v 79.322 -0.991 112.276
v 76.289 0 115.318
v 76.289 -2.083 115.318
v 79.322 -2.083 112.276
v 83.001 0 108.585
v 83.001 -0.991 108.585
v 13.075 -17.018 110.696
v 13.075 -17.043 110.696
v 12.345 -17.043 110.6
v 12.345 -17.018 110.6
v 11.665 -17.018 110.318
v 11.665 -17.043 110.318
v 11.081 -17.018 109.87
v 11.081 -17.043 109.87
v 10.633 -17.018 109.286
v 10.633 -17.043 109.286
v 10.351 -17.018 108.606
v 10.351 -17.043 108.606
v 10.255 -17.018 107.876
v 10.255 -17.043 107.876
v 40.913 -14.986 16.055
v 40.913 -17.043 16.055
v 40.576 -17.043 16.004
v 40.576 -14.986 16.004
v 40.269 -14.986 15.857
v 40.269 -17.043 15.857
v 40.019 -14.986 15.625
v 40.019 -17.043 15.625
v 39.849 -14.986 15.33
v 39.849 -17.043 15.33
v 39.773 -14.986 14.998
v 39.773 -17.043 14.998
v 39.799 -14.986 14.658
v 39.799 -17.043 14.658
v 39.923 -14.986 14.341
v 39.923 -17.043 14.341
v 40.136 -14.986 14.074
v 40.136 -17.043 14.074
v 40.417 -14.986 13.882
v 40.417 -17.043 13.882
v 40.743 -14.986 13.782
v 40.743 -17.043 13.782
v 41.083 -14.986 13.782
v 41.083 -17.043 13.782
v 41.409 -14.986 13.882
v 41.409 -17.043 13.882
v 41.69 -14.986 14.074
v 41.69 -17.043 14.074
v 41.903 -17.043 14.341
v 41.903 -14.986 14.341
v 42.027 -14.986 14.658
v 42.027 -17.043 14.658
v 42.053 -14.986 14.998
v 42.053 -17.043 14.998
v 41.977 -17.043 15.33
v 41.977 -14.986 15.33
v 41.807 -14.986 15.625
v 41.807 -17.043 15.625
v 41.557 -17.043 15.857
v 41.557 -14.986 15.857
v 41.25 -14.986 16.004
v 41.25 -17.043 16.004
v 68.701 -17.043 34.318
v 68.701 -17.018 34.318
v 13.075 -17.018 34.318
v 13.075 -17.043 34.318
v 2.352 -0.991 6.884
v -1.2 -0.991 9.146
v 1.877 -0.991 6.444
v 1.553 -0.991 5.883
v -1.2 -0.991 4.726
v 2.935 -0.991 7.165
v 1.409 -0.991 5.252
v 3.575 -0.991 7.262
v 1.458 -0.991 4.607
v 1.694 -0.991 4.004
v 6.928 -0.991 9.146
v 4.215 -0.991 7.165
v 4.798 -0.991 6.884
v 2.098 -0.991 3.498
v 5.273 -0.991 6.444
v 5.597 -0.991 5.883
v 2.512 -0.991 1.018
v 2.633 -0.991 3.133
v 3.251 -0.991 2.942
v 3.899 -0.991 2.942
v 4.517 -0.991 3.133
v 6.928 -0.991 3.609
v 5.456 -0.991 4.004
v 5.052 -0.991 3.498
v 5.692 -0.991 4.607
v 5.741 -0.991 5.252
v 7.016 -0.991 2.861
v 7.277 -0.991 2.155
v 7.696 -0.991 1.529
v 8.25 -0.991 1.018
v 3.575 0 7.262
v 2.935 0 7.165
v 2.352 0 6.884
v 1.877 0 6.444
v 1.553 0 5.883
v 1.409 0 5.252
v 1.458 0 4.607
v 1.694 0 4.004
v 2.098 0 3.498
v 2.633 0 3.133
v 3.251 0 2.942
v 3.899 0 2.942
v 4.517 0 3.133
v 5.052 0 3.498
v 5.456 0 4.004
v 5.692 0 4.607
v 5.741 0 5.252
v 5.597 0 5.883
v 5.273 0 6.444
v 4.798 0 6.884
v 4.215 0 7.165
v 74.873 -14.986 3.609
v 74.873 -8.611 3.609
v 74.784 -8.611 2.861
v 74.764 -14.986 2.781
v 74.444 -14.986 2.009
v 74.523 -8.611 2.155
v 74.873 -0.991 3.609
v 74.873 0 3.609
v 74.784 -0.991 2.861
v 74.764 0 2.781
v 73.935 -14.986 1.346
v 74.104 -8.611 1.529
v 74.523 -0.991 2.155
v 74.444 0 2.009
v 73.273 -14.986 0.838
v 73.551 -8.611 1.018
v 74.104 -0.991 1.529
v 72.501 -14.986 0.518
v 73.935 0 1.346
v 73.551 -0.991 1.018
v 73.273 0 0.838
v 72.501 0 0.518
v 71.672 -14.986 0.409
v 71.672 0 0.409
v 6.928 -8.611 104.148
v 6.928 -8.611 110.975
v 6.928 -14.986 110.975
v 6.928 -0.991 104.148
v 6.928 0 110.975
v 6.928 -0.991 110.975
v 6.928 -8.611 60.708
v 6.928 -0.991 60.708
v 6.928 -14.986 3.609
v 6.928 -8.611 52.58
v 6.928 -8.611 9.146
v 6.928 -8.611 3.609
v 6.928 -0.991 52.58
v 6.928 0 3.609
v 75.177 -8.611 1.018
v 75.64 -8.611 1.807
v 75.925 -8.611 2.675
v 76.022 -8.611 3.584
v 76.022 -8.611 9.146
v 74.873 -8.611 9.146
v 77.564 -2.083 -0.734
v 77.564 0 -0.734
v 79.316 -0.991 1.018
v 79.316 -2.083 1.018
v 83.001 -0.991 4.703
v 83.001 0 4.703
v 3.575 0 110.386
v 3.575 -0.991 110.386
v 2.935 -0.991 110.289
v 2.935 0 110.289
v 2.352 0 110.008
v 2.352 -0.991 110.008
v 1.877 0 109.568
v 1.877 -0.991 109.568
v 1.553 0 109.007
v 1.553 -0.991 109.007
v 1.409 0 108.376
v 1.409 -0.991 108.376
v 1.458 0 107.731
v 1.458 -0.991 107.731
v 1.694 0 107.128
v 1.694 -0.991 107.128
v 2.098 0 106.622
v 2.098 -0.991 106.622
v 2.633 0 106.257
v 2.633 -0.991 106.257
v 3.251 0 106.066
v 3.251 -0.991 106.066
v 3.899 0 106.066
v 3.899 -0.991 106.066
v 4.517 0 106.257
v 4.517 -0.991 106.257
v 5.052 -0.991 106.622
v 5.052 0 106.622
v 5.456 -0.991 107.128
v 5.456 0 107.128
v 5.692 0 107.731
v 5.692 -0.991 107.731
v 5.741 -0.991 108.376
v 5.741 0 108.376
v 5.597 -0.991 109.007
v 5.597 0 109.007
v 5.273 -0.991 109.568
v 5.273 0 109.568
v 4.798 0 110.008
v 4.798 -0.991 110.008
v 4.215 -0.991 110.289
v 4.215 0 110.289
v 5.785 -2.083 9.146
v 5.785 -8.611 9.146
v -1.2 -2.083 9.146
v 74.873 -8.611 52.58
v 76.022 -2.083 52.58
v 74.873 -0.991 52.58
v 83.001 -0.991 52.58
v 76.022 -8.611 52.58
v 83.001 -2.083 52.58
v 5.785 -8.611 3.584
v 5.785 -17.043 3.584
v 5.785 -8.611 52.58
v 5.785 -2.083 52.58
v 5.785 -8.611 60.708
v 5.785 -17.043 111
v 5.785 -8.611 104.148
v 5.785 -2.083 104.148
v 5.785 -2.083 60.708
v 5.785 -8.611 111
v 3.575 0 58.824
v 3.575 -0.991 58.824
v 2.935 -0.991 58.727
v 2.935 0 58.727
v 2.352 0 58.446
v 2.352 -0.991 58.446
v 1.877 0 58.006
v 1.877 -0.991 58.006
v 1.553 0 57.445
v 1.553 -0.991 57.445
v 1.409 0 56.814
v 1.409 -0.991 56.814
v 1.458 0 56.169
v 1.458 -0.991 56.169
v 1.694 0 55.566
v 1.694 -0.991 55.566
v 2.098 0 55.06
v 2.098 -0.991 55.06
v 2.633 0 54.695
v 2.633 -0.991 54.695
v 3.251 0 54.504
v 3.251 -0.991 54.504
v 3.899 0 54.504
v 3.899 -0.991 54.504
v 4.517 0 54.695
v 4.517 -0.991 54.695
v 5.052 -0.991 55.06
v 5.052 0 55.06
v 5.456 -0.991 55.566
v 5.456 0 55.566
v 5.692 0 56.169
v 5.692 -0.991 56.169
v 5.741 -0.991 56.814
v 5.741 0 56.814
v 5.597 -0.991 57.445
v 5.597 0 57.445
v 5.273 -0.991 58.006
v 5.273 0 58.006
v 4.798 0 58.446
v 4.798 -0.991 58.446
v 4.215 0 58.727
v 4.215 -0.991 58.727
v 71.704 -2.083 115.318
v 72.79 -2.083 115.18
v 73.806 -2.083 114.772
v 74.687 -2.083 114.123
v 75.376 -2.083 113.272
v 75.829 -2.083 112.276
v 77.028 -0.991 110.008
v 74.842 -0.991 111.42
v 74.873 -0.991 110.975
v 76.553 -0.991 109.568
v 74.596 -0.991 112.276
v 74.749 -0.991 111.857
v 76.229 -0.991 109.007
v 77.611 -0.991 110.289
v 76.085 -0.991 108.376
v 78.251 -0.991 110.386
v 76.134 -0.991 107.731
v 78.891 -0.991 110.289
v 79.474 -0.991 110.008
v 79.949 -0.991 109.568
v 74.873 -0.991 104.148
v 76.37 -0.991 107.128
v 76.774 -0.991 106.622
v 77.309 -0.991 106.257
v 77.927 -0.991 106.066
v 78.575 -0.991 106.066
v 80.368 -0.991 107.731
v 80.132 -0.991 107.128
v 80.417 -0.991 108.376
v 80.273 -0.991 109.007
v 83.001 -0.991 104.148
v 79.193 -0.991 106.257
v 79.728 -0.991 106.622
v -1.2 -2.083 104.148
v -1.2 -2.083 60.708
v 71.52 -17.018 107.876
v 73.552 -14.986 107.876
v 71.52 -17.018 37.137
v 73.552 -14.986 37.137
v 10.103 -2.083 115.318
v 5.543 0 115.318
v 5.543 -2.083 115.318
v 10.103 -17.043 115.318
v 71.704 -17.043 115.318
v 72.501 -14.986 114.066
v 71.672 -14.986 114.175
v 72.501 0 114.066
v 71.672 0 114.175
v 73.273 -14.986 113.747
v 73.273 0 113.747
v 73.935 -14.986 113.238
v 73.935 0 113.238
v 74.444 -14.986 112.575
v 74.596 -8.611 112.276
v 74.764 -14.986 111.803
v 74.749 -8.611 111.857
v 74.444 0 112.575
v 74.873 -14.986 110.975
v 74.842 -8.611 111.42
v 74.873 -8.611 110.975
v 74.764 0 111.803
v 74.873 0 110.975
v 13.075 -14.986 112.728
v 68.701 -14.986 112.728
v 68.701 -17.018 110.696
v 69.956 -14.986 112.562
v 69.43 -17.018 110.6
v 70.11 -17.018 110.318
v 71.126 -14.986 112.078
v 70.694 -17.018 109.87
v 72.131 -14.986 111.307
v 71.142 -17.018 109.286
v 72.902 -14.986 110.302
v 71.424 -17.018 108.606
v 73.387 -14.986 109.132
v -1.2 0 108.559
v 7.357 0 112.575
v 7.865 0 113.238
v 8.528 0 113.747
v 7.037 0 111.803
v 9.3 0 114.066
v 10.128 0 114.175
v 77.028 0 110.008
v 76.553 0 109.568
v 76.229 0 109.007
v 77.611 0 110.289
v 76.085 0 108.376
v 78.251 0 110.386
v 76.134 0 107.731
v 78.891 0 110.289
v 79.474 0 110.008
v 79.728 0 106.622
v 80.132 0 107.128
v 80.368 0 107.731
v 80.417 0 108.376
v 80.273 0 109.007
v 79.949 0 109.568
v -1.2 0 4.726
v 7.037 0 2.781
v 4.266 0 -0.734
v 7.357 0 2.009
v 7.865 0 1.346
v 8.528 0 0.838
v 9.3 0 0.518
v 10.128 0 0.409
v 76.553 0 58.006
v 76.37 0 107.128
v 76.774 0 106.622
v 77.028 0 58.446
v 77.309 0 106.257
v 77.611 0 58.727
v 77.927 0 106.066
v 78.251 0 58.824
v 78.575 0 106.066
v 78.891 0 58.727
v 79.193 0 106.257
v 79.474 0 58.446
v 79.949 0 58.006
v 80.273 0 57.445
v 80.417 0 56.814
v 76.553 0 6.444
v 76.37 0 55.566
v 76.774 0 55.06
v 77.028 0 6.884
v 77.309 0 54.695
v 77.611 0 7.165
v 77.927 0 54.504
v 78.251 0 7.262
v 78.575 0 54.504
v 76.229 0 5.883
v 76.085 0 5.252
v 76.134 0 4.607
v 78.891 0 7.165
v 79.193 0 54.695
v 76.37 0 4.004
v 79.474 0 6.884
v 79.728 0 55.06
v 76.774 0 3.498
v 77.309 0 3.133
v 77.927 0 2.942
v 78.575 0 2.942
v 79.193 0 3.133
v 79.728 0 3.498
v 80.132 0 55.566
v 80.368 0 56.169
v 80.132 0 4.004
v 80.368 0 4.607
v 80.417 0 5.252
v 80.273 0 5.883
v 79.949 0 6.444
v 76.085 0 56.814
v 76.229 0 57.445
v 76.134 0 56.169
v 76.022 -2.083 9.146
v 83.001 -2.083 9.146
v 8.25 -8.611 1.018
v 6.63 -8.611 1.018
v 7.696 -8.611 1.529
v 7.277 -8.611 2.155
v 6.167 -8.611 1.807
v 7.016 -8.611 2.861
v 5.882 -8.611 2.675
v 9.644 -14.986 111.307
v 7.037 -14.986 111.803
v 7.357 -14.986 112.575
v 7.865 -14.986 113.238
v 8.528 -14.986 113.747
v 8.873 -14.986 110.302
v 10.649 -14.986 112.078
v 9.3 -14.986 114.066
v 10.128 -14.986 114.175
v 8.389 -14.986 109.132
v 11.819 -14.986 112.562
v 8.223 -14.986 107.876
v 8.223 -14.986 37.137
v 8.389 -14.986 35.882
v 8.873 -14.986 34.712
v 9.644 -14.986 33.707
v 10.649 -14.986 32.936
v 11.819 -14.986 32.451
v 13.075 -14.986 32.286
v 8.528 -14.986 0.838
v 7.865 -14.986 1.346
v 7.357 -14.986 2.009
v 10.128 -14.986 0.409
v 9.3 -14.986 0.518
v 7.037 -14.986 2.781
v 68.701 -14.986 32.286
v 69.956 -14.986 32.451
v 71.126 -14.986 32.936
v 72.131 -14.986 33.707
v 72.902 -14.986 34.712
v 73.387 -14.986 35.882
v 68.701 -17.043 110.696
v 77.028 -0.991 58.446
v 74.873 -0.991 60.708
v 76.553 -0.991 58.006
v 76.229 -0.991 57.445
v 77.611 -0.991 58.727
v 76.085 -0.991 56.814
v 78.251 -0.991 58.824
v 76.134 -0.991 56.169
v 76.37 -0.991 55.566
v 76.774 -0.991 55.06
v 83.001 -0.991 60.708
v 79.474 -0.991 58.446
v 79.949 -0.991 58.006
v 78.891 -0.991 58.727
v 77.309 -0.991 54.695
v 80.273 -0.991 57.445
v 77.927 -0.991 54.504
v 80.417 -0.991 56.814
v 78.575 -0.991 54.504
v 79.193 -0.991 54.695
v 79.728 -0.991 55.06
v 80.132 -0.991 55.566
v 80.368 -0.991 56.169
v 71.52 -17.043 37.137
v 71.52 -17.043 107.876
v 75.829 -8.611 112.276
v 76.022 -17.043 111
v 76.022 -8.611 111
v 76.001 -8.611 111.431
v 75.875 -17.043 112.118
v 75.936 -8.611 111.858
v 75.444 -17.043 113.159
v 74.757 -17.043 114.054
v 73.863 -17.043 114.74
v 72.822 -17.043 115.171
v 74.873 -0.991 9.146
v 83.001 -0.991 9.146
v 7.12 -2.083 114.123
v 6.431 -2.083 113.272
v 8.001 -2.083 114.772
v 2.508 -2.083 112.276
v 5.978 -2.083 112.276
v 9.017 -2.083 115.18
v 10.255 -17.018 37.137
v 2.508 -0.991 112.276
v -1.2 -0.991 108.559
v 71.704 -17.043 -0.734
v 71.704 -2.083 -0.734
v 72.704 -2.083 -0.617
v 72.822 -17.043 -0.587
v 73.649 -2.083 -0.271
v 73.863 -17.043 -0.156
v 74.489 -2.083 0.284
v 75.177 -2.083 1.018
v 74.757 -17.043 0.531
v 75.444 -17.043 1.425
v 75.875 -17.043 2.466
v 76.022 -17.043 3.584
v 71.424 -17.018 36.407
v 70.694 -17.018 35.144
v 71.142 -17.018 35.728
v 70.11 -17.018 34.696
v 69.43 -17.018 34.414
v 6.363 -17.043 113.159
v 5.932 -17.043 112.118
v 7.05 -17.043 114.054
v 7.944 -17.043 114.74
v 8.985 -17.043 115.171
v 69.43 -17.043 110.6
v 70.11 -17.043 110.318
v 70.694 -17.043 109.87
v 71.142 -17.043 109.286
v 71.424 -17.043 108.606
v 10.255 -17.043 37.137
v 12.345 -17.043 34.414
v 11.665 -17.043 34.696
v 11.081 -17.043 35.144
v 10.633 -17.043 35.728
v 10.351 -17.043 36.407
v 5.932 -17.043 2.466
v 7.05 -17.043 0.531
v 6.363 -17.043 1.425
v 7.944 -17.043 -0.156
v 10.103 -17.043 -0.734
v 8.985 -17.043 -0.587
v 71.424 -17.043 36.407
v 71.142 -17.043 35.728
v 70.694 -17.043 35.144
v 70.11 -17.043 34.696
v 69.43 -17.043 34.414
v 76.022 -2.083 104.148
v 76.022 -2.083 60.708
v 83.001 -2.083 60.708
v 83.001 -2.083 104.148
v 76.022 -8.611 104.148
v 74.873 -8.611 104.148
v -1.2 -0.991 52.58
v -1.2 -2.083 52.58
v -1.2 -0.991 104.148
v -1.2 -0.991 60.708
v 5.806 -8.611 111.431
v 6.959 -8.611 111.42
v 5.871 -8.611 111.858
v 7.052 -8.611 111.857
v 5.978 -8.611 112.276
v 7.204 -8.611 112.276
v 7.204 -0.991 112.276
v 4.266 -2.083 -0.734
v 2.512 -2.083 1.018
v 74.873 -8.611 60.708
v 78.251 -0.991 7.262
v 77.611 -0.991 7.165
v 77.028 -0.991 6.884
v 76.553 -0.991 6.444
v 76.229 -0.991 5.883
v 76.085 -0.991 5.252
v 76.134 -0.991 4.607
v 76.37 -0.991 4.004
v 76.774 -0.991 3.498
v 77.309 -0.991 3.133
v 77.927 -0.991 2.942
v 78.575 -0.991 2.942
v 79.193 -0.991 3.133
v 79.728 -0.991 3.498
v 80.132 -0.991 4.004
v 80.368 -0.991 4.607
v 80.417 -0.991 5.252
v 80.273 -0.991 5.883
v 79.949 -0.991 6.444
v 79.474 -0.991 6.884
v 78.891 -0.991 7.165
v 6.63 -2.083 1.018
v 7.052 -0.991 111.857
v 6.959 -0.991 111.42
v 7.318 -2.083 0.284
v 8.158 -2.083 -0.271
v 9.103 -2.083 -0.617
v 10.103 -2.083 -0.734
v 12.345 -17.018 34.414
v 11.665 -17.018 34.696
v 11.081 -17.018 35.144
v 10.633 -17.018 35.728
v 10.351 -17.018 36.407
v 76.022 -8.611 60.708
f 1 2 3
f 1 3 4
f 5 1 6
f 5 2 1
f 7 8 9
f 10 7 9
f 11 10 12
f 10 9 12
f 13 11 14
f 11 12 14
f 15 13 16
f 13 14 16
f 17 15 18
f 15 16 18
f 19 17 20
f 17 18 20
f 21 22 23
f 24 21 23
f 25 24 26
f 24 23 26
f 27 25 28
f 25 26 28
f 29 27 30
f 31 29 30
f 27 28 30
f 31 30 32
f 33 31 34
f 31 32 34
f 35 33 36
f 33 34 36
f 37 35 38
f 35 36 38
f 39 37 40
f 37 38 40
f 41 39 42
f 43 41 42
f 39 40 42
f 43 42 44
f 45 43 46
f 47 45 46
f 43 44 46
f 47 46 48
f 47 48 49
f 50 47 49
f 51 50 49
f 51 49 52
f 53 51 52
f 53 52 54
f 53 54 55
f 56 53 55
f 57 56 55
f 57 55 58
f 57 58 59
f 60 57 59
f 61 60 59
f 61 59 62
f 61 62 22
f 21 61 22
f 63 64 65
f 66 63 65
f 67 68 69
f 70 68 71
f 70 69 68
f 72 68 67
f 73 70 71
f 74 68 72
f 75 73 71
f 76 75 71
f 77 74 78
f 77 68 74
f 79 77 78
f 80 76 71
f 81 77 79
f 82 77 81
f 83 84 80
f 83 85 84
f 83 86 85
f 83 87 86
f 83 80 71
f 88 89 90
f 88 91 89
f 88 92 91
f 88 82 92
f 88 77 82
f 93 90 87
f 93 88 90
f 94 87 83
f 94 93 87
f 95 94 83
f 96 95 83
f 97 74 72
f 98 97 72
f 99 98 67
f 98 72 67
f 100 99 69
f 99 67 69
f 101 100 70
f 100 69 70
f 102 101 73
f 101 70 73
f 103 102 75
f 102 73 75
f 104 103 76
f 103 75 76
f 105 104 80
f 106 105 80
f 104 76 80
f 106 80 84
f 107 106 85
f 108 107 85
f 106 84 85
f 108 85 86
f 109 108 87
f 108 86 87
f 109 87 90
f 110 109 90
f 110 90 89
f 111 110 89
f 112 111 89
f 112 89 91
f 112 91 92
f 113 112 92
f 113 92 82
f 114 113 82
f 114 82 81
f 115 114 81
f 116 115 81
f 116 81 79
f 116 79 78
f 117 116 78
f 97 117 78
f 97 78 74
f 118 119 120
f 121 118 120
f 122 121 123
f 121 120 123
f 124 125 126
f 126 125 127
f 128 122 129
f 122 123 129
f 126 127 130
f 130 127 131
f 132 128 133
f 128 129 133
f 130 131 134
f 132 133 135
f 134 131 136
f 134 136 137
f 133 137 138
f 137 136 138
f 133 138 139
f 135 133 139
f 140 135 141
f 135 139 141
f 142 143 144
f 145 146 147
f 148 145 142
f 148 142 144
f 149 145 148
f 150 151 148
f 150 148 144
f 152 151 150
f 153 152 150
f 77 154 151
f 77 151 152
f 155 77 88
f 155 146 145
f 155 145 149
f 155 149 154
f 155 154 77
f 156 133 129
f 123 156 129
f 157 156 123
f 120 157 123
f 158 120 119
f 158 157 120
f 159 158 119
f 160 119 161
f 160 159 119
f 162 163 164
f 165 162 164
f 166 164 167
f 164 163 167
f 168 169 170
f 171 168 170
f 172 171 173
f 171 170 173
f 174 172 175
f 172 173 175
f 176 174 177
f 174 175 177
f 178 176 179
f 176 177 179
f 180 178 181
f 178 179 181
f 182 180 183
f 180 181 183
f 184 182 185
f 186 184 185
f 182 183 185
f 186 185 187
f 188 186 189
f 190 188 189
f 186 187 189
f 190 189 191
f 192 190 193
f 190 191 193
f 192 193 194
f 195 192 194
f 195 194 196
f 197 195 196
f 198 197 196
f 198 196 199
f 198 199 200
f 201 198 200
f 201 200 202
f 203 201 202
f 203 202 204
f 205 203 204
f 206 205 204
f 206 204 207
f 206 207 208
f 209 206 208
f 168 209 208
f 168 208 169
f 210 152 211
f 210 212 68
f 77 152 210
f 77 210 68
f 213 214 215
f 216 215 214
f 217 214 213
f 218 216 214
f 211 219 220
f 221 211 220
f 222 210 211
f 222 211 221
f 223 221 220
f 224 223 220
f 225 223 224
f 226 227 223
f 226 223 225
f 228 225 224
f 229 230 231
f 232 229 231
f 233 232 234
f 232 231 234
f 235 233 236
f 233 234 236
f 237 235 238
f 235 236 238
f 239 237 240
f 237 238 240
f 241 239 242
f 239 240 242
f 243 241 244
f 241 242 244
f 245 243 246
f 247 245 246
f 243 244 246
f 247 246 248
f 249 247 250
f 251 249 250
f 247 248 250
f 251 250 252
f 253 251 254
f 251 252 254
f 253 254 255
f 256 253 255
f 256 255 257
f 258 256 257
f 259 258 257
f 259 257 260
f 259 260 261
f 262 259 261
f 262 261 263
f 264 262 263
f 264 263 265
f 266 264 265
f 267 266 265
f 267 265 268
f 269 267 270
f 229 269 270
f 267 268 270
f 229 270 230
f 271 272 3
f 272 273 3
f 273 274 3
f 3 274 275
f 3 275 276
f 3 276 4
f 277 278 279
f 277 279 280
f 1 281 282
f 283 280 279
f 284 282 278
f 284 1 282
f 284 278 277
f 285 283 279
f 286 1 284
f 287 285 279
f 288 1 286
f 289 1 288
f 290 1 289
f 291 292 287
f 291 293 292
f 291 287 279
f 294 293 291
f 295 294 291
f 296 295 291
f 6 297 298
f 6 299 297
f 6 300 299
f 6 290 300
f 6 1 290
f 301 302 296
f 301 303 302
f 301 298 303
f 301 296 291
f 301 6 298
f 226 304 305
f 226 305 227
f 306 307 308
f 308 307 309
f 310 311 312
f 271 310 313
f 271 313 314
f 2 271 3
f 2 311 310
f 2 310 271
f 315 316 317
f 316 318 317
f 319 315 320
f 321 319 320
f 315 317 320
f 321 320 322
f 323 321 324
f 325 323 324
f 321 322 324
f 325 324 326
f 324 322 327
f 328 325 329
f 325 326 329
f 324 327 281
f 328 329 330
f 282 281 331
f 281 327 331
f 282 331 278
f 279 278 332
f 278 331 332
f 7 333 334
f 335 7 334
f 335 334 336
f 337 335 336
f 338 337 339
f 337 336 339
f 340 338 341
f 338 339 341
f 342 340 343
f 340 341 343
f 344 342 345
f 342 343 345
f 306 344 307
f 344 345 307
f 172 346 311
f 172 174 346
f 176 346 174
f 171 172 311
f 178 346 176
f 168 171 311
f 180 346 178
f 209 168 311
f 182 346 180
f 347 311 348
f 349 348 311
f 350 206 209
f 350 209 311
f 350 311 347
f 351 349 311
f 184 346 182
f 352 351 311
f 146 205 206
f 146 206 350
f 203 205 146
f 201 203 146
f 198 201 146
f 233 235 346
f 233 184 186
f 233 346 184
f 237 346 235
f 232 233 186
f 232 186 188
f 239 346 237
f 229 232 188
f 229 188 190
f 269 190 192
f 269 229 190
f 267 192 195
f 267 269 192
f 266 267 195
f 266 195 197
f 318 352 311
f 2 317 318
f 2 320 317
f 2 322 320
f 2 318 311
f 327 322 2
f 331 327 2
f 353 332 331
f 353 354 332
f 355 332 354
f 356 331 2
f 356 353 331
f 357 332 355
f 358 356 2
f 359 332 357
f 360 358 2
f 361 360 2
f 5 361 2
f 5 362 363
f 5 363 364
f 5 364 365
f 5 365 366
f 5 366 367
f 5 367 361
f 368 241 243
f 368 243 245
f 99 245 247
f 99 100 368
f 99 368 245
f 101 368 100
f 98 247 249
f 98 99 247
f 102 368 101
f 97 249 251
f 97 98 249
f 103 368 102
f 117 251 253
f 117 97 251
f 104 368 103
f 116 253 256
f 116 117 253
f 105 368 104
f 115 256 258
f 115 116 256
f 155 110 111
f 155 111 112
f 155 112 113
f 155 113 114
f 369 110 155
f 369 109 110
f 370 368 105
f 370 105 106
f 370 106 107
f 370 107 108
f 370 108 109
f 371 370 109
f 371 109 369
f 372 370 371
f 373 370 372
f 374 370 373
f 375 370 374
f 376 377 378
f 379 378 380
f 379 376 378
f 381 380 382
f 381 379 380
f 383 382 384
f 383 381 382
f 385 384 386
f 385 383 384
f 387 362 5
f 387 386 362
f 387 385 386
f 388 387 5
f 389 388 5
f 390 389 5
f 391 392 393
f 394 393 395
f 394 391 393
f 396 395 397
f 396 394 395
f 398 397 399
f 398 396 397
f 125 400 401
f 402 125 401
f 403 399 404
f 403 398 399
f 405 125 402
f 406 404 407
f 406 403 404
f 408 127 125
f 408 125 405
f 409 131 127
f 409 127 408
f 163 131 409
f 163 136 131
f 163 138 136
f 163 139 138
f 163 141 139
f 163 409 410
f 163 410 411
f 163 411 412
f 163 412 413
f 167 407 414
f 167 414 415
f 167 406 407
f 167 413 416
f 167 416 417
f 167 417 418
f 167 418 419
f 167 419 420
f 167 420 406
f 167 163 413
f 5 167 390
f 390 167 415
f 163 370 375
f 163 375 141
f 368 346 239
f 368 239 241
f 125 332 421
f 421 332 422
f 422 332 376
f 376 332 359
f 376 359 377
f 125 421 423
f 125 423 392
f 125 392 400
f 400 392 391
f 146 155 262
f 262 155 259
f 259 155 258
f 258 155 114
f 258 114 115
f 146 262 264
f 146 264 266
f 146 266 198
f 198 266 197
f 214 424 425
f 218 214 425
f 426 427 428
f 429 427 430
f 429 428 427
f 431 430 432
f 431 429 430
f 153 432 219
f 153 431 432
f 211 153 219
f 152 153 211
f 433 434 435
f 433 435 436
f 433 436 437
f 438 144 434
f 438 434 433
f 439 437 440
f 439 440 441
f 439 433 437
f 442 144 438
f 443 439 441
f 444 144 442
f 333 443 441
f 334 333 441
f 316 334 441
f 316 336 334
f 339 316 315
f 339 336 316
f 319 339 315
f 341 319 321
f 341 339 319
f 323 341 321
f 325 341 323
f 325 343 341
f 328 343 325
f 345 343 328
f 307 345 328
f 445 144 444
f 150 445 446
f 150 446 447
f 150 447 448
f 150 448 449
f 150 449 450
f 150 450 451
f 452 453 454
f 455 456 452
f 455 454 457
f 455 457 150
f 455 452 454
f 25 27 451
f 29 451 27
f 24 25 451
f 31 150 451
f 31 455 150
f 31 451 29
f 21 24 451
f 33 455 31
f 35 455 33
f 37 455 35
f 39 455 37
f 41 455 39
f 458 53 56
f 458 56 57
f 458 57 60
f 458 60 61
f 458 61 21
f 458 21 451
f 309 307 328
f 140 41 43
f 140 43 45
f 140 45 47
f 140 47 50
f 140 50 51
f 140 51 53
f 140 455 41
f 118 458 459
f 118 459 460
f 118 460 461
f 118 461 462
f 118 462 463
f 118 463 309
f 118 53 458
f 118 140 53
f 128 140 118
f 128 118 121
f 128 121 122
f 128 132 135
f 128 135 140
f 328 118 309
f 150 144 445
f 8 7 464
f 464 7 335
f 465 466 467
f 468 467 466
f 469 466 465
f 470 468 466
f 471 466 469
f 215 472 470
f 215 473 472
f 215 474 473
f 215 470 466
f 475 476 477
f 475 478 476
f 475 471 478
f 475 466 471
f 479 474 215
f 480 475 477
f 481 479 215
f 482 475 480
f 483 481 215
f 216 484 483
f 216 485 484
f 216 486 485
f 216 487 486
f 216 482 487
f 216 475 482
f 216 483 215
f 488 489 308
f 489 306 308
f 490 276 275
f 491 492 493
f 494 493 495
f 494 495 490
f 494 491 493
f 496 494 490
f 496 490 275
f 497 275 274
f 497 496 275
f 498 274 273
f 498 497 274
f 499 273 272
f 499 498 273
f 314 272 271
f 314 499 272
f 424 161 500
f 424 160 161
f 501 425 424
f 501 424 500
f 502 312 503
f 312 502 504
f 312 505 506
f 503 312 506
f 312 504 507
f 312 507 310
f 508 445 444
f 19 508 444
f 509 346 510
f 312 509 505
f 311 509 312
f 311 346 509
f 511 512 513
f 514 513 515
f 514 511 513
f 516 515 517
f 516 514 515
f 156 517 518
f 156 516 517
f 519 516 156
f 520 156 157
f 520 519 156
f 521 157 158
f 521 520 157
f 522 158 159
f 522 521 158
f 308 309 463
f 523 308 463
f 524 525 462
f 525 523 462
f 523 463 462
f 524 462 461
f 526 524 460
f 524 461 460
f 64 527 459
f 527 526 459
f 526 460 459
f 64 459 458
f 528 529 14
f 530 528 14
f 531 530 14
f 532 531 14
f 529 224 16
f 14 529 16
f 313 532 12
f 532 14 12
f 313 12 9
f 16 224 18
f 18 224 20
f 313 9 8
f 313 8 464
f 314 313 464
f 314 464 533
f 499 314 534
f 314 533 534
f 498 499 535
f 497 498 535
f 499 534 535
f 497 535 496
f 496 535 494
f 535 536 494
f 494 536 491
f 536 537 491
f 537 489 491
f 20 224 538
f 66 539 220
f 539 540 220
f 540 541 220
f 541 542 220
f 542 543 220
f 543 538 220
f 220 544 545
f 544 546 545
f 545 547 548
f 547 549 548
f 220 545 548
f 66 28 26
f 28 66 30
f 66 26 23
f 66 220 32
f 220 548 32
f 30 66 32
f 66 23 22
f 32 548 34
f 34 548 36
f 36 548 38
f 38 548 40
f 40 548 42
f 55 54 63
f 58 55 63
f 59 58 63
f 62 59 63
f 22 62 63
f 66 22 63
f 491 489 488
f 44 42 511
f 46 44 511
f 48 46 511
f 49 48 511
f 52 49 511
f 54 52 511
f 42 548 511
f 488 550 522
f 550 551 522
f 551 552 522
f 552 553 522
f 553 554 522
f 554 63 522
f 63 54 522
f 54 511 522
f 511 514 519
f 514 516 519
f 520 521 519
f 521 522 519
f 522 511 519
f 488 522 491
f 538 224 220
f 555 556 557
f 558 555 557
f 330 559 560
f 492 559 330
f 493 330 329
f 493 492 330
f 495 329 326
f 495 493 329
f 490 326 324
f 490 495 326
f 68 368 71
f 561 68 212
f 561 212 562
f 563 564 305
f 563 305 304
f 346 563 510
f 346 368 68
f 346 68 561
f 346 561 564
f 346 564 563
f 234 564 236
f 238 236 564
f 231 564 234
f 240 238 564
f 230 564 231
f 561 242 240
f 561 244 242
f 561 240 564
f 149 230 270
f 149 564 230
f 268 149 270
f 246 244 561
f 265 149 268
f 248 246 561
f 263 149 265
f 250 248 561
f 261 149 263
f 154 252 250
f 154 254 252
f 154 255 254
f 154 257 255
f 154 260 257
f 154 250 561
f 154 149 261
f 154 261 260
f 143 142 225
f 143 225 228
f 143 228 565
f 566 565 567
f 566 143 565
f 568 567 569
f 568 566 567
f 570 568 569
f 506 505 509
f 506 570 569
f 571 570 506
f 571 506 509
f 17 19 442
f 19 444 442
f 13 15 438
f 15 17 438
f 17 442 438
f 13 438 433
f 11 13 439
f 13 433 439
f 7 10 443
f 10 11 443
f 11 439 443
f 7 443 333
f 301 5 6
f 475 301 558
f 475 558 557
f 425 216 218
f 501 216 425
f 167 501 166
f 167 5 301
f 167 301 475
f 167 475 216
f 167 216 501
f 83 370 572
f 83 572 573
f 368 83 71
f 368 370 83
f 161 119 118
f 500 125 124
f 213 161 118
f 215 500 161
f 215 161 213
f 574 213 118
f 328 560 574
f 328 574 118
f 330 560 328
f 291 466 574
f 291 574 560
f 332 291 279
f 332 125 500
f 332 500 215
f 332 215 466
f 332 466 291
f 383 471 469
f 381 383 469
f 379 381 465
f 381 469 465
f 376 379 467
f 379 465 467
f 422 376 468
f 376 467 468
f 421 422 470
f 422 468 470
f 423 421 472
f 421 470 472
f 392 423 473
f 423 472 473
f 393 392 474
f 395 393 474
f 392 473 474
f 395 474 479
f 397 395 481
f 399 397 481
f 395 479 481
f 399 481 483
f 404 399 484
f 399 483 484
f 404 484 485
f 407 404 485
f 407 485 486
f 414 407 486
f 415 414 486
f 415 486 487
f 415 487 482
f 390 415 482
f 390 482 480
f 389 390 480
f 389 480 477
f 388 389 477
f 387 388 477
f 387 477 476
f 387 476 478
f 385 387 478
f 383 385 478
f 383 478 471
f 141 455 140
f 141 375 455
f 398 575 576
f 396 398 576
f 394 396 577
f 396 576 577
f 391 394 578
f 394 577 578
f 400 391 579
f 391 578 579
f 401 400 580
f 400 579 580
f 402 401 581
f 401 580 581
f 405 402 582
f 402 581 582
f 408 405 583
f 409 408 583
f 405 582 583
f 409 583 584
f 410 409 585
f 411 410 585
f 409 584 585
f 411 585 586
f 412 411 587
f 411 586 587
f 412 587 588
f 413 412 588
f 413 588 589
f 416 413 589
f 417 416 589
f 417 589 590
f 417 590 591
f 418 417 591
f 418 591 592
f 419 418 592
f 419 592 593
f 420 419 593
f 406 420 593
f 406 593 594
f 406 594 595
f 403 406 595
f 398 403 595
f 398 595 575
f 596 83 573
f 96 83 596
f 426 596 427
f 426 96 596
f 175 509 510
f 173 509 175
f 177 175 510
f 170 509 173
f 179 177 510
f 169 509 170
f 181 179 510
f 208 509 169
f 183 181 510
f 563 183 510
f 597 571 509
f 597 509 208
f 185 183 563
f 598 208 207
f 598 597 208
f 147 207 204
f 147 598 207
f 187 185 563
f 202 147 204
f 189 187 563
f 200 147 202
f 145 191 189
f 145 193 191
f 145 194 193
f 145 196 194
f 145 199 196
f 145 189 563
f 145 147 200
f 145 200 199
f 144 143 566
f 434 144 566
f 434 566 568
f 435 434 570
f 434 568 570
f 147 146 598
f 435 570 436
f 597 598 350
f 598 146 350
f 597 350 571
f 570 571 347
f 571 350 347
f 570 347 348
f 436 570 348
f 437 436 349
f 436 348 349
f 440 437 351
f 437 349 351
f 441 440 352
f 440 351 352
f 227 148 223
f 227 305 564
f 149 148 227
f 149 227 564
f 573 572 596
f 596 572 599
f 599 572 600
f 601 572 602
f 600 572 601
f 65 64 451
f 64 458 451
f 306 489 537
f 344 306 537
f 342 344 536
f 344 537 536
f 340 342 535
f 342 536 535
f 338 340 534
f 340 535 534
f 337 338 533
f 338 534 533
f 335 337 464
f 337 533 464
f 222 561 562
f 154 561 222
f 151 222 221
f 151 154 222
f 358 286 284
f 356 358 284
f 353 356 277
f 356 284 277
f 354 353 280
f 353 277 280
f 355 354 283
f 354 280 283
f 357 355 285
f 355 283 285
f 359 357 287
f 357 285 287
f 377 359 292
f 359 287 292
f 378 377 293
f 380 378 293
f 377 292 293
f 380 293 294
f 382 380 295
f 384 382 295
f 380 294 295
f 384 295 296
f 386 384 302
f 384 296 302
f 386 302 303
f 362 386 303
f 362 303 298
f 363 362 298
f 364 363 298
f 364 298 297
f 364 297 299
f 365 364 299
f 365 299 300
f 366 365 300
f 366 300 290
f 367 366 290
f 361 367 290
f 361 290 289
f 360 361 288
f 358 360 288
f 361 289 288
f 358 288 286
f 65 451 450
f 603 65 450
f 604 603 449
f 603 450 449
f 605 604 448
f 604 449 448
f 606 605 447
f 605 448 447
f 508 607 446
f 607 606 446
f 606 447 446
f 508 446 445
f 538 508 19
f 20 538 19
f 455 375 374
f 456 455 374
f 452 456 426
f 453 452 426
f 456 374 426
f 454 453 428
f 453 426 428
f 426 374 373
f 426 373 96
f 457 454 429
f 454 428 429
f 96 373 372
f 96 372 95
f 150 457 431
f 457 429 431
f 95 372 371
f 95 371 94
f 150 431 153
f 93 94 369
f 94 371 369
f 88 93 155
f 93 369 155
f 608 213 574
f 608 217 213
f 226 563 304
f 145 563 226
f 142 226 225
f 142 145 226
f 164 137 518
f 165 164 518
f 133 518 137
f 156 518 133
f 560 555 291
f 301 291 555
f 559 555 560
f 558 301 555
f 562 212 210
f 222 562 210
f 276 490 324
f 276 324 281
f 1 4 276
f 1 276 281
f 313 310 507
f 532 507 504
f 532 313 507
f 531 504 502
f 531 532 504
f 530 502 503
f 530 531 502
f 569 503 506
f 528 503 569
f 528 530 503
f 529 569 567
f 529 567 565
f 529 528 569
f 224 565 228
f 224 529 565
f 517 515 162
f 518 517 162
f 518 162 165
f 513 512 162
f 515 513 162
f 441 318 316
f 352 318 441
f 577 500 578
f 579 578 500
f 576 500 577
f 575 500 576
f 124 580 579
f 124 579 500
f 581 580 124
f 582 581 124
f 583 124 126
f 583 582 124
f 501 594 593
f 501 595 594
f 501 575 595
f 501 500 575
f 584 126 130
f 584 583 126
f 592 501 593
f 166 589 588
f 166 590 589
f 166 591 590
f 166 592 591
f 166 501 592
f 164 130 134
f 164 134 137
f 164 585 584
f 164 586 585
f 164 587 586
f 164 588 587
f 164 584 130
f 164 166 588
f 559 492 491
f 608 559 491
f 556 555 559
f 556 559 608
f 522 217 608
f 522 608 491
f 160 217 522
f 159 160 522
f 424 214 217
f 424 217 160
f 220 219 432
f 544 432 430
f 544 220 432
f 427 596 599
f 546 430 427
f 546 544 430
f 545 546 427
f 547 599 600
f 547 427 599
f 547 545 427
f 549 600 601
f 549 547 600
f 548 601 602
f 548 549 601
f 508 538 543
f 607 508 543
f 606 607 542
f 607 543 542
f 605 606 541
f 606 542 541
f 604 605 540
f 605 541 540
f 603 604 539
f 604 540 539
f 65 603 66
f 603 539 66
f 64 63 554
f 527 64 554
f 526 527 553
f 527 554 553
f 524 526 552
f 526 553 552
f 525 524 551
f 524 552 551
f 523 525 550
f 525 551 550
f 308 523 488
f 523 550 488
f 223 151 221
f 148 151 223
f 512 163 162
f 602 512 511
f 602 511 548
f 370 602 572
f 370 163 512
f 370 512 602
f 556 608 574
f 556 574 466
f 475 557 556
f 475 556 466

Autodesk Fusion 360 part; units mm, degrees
sketch "Front" plane through (0, 0, 0) normal (0, 1, 0) x (1, 0, 0) in component "2004699A"
  line L0 (-34.4613, 0.7342) -> (100.7673, 0.7342) construction
  line L1 (-34.854, -115.3184) -> (120.0108, -115.3184) construction
  line L2 (39.1093, -14.9122) -> (120.6654, -14.9122) construction
  line L3 (3.575, 24.5274) -> (3.575, -141.9882) construction
  line L4 (78.251, 23.8729) -> (78.251, -119.9956) construction
  line L5 (-16.7886, -108.2138) -> (88.0691, -108.2138) construction
  line L6 (-18.2286, -5.0898) -> (85.3201, -5.0898) construction
  line L7 (-8.6723, -56.6518) -> (96.0546, -56.6518) construction
  line L8 (-24.3813, -113.9722) -> (90.4255, -113.9722) construction
  line L9 (-27.0881, -0.4088) -> (83.5136, -0.4088) construction
  line L10 (10.2552, -130.527) -> (10.2552, 10.1996) construction
  line L11 (71.52, -130.1852) -> (71.52, 12.6775) construction
  line L12 (5.7848, -130.0998) -> (5.7848, 6.3546) construction
  line L13 (83.0008, -137.1267) -> (83.0008, 10.6162) construction
  line L14 (-1.2002, -137.339) -> (-1.2002, 17.644) construction
  line L15 (110.5413, -110.6956) -> (5.7848, -110.6956) construction
  line L16 (110.1974, -34.3178) -> (-2.9547, -34.3178) construction
  line L17 (102.8889, -60.7158) -> (-8.8875, -60.7158) construction
  line L18 (102.459, -52.5878) -> (-11.4669, -52.5878) construction
  line L19 (40.913, -17.1802) -> (40.913, 17.1835) construction
  line L20 (69.6478, 8.6501) -> (89.4046, -11.1067) construction
  line L21 (-5.4342, -8.9542) -> (10.2552, 6.7154) construction
  line L22 (-6.1303, -103.6453) -> (12.6902, -122.4658) construction
  line L23 (73.7302, -117.8806) -> (90.3753, -101.2137) construction
  line L24 (-2.868, -104.1498) -> (87.443, -104.1498) construction
  line L25 (-3.4391, -112.2778) -> (87.0011, -112.2778) construction
  line L26 (-3.1536, -9.1538) -> (86.0732, -9.1538) construction
  line L27 (-3.3677, -1.0258) -> (85.288, -1.0258) construction
  line L28 (10.2552, -110.6956) -> (71.52, -110.6956)
  line L29 (71.52, -110.6956) -> (71.52, -34.3178)
  line L30 (71.52, -34.3178) -> (10.2552, -34.3178)
  line L31 (10.2552, -34.3178) -> (10.2552, -110.6956)
  line L32 (-1.2002, -115.3184) -> (83.0008, -115.3184)
  line L33 (83.0008, -115.3184) -> (83.0008, 0.7342)
  line L34 (83.0008, 0.7342) -> (-1.2002, 0.7342)
  line L35 (-1.2002, 0.7342) -> (-1.2002, -115.3184)
  line L36 (76.0158, -119.9569) -> (76.0158, 9.6762) construction
  line L37 (5.7848, -115.3184) -> (76.0222, -115.3184) construction
  line L38 (76.0222, -115.3184) -> (76.0222, 0.7342) construction
  line L39 (76.0222, 0.7342) -> (5.7848, 0.7342) construction
  line L40 (5.7848, 0.7342) -> (5.7848, -115.3184) construction
  line L41 (76.0222, 0.7342) -> (5.7848, 0.7342)
  line L42 (5.7848, 0.7342) -> (5.7848, -115.3184)
  line L43 (5.7848, -115.3184) -> (76.0222, -115.3184)
  line L44 (76.0222, -115.3184) -> (76.0222, 0.7342)
  line L45 (-1.2002, -108.5588) -> (5.5429, -115.3184)
  line L46 (76.2891, -115.3184) -> (83.0008, -108.585)
  line L47 (77.5637, 0.7342) -> (83.0008, -4.7029)
  line L48 (4.2664, 0.7342) -> (-1.2002, -4.7255)
  point P0 (3.575, -108.2138)
  point P1 (78.251, -108.2138)
  point P2 (78.251, -56.6518)
  point P3 (78.251, -5.0898)
  point P4 (3.575, -5.0898)
  point P5 (3.575, -56.6518)
  point P6 (40.913, -14.9122)
  dimension "d1" = 1.143
  dimension "d2" = 116.0526
  dimension "d3" = 113.5634
  dimension "d4" = 103.124
  dimension "d5" = 51.562
  dimension "d6" = 74.676
  dimension "d7" = 2.2098
  dimension "d8" = 4.4704
  dimension "d9" = 61.2648
  dimension "d10" = 84.201
  dimension "d11" = 6.985
  dimension "d12" = 76.3778
  dimension "d13" = 4.6228
  dimension "d14" = 100.4062
  dimension "d15" = 37.338
  dimension "d16" = 8.128
  dimension "d17" = 4.064
  dimension "d18" = 3.6322
  dimension "d19" = 3.6322
  dimension "d20" = 3.6322
  dimension "d21" = 3.6322
  dimension "d22" = 4.064
  dimension "d23" = 8.128
  dimension "d25" = 4.064
  dimension "d26" = 8.128
  dimension "d27" = 70.231
extrude "Extrude1" add sketch "Front" against normal blind 17.0434 contours L32 L34 L41 L42 L43 L44 in component "2004699A"
extrude "Extrude2" add sketch "Front" against normal blind 2.0828 contours L32 L34 L35 L42 L45 L48 | L32 L33 L34 L44 L46 L47 in component "2004699A"
fillet "Fillet1" radius 4.318 4 edges at (5.7848, -9.5631, -0.7342) (76.0222, -9.5631, -0.7342) (76.0222, -9.5631, 115.3184) (5.7848, -9.5631, 115.3184) in component "2004699A"
fillet "Fillet2" radius 2.8194 4 edges at (71.52, -8.5217, 110.6956) (10.2552, -8.5217, 110.6956) (71.52, -8.5217, 34.3178) (10.2552, -8.5217, 34.3178) in component "2004699A"
hole "Hole1" at (78.251, 0, 108.2138) at (78.251, 0, 56.6518) at (78.251, 0, 5.0898) at (3.575, 0, 5.0898) at (3.575, 0, 56.6518) at (3.575, 0, 108.2138) direction (0, -1, 0) diameter 4.3434 end through all in component "2004699A"
sketch "Sketch3" plane through (0, 0, 0) normal (0, 1, 0) x (1, 0, 0) in component "2004699A"
  line L0 (88.5571, -114.1754) -> (-29.017, -114.1754) construction
  line L1 (6.9278, -119.135) -> (6.9278, -3.6092) construction
  line L2 (74.8728, -110.975) -> (74.8728, 6.1599) construction
  line L3 (95.5329, -0.4088) -> (-26.782, -0.4088) construction
  line L4 (-34.4613, 0.7342) -> (100.7673, 0.7342) construction
  line L5 (5.7848, -130.0998) -> (5.7848, 6.3546) construction
  line L6 (-34.854, -115.3184) -> (120.0108, -115.3184) construction
  line L7 (76.0158, -119.9569) -> (76.0158, 9.6762) construction
  line L8 (71.6724, -114.1754) -> (10.1282, -114.1754)
  line L9 (6.9278, -110.975) -> (6.9278, -0.4088)
  line L10 (10.1282, -0.4088) -> (71.6724, -0.4088)
  line L11 (74.8728, -3.6092) -> (74.8728, -114.1754)
  arc A0 (74.8728, -3.6092) -> (71.6724, -0.4088) centre (71.6724, -3.6092) ccw
  arc A1 (10.1282, -0.4088) -> (6.9278, -3.6092) centre (10.1282, -3.6092) ccw
  arc A2 (71.6724, -114.1754) -> (74.8728, -110.975) centre (71.6724, -110.975) ccw
  arc A3 (6.9278, -110.975) -> (10.1282, -114.1754) centre (10.1282, -110.975) ccw
  dimension "d37" = 1.143
  dimension "d38" = 1.143
  dimension "d39" = 1.143
  dimension "d40" = 1.143
  dimension "d41" = 3.2004
  dimension "d42" = 3.2004
  dimension "d43" = 3.2004
  dimension "d44" = 3.2004
extrude "Extrude3" cut sketch "Sketch3" against normal blind 14.986 in component "2004699A"
chamfer "Chamfer1" distance 2.032 angle 45 8 edges at (40.8876, -14.986, 34.3178) (11.081, -14.986, 35.1436) (10.2552, -14.986, 72.5067) (11.081, -14.986, 109.8698) (40.8876, -14.986, 110.6956) (70.6942, -14.986, 109.8698) (71.52, -14.986, 72.5067) (70.6942, -14.986, 35.1436) in component "2004699A"
sketch "Sketch4" plane through (83.0008, 0, 0) normal (1, 0, 0) x (0, 1, 0) in component "2004699A"
  line L0 (0, 4.7029) -> (0, 108.585)
  line L1 (0, 108.585) -> (-2.0828, 108.585)
  line L2 (-2.0828, 108.585) -> (-2.0828, 4.7029)
  line L3 (-2.0828, 4.7029) -> (0, 4.7029)
  line L4 (-0.9906, 121.8672) -> (-0.9906, -5.2486) construction
  line L5 (0, 108.2121) -> (-3.3976, 108.2121) construction
  line L6 (0, 56.644) -> (-3.817, 56.644) construction
  line L7 (0, 0) -> (-1.1062, 0) construction
  line L8 (1.8872, 112.2761) -> (-9.9271, 112.2761) construction
  line L9 (1.8112, 104.1481) -> (-10.4595, 104.1481) construction
  line L10 (1.71, 60.708) -> (-9.8241, 60.708) construction
  line L11 (2.1656, 52.58) -> (0.9254, 52.58) construction
  line L12 (0.9254, 52.58) -> (-9.5412, 52.58) construction
  line L13 (0, 5.0822) -> (-6.1548, 5.0822) construction
  line L14 (2.1892, 9.1462) -> (-10.0058, 9.1462) construction
  line L15 (2.6197, 1.0182) -> (-10.581, 1.0182) construction
  line L16 (-8.6106, 122.6091) -> (-8.6106, -10.4565) construction
  line L17 (-8.6106, 60.708) -> (-0.9906, 60.708)
  line L18 (-0.9906, 60.708) -> (-0.9906, 52.58)
  line L19 (-0.9906, 52.58) -> (-8.6106, 52.58)
  line L20 (-8.6106, 52.58) -> (-8.6106, 60.708)
  line L21 (-8.6106, 9.1462) -> (-0.9906, 9.1462)
  line L22 (-0.9906, 9.1462) -> (-0.9906, 1.0182)
  line L23 (-0.9906, 1.0182) -> (-8.6106, 1.0182)
  line L24 (-8.6106, 1.0182) -> (-8.6106, 9.1462)
  line L25 (-8.6106, 112.2761) -> (-0.9906, 112.2761)
  line L26 (-0.9906, 112.2761) -> (-0.9906, 104.1481)
  line L27 (-0.9906, 104.1481) -> (-8.6106, 104.1481)
  line L28 (-8.6106, 104.1481) -> (-8.6106, 112.2761)
  point P0 (0, 119.9956)
  dimension "d48" = 0.9906
  dimension "d49" = 4.064
  dimension "d50" = 8.128
  dimension "d51" = 4.064
  dimension "d52" = 8.128
  dimension "d54" = 4.064
  dimension "d55" = 8.128
  dimension "d56" = 7.62
extrude "Extrude4" cut sketch "Sketch4" against normal through all contours L2 L3 L21 L22 L23 L24 | L2 L3 L21 L22 | L1 L2 L26 L27 | L1 L2 L25 L26 L27 L28 | L2 L17 L19 L20 | L2 L17 L18 L19 in component "2004699A"
hole "Hole2" at (40.913, 0, 14.9122) direction (0, -1, 0) diameter 2.286 end through all in component "2004699A"
component "2004699A" placed x (1, 0, 0) y (0, 1, 0) z (0, 0, 1) at (0, 0, 0)
equation "d41 = 0.171 in - 0.045 in"
equation "d42 = 0.171 in - 0.045 in"
equation "d43 = 0.171 in - 0.045 in"
equation "d44 = 0.171 in - 0.045 in"
